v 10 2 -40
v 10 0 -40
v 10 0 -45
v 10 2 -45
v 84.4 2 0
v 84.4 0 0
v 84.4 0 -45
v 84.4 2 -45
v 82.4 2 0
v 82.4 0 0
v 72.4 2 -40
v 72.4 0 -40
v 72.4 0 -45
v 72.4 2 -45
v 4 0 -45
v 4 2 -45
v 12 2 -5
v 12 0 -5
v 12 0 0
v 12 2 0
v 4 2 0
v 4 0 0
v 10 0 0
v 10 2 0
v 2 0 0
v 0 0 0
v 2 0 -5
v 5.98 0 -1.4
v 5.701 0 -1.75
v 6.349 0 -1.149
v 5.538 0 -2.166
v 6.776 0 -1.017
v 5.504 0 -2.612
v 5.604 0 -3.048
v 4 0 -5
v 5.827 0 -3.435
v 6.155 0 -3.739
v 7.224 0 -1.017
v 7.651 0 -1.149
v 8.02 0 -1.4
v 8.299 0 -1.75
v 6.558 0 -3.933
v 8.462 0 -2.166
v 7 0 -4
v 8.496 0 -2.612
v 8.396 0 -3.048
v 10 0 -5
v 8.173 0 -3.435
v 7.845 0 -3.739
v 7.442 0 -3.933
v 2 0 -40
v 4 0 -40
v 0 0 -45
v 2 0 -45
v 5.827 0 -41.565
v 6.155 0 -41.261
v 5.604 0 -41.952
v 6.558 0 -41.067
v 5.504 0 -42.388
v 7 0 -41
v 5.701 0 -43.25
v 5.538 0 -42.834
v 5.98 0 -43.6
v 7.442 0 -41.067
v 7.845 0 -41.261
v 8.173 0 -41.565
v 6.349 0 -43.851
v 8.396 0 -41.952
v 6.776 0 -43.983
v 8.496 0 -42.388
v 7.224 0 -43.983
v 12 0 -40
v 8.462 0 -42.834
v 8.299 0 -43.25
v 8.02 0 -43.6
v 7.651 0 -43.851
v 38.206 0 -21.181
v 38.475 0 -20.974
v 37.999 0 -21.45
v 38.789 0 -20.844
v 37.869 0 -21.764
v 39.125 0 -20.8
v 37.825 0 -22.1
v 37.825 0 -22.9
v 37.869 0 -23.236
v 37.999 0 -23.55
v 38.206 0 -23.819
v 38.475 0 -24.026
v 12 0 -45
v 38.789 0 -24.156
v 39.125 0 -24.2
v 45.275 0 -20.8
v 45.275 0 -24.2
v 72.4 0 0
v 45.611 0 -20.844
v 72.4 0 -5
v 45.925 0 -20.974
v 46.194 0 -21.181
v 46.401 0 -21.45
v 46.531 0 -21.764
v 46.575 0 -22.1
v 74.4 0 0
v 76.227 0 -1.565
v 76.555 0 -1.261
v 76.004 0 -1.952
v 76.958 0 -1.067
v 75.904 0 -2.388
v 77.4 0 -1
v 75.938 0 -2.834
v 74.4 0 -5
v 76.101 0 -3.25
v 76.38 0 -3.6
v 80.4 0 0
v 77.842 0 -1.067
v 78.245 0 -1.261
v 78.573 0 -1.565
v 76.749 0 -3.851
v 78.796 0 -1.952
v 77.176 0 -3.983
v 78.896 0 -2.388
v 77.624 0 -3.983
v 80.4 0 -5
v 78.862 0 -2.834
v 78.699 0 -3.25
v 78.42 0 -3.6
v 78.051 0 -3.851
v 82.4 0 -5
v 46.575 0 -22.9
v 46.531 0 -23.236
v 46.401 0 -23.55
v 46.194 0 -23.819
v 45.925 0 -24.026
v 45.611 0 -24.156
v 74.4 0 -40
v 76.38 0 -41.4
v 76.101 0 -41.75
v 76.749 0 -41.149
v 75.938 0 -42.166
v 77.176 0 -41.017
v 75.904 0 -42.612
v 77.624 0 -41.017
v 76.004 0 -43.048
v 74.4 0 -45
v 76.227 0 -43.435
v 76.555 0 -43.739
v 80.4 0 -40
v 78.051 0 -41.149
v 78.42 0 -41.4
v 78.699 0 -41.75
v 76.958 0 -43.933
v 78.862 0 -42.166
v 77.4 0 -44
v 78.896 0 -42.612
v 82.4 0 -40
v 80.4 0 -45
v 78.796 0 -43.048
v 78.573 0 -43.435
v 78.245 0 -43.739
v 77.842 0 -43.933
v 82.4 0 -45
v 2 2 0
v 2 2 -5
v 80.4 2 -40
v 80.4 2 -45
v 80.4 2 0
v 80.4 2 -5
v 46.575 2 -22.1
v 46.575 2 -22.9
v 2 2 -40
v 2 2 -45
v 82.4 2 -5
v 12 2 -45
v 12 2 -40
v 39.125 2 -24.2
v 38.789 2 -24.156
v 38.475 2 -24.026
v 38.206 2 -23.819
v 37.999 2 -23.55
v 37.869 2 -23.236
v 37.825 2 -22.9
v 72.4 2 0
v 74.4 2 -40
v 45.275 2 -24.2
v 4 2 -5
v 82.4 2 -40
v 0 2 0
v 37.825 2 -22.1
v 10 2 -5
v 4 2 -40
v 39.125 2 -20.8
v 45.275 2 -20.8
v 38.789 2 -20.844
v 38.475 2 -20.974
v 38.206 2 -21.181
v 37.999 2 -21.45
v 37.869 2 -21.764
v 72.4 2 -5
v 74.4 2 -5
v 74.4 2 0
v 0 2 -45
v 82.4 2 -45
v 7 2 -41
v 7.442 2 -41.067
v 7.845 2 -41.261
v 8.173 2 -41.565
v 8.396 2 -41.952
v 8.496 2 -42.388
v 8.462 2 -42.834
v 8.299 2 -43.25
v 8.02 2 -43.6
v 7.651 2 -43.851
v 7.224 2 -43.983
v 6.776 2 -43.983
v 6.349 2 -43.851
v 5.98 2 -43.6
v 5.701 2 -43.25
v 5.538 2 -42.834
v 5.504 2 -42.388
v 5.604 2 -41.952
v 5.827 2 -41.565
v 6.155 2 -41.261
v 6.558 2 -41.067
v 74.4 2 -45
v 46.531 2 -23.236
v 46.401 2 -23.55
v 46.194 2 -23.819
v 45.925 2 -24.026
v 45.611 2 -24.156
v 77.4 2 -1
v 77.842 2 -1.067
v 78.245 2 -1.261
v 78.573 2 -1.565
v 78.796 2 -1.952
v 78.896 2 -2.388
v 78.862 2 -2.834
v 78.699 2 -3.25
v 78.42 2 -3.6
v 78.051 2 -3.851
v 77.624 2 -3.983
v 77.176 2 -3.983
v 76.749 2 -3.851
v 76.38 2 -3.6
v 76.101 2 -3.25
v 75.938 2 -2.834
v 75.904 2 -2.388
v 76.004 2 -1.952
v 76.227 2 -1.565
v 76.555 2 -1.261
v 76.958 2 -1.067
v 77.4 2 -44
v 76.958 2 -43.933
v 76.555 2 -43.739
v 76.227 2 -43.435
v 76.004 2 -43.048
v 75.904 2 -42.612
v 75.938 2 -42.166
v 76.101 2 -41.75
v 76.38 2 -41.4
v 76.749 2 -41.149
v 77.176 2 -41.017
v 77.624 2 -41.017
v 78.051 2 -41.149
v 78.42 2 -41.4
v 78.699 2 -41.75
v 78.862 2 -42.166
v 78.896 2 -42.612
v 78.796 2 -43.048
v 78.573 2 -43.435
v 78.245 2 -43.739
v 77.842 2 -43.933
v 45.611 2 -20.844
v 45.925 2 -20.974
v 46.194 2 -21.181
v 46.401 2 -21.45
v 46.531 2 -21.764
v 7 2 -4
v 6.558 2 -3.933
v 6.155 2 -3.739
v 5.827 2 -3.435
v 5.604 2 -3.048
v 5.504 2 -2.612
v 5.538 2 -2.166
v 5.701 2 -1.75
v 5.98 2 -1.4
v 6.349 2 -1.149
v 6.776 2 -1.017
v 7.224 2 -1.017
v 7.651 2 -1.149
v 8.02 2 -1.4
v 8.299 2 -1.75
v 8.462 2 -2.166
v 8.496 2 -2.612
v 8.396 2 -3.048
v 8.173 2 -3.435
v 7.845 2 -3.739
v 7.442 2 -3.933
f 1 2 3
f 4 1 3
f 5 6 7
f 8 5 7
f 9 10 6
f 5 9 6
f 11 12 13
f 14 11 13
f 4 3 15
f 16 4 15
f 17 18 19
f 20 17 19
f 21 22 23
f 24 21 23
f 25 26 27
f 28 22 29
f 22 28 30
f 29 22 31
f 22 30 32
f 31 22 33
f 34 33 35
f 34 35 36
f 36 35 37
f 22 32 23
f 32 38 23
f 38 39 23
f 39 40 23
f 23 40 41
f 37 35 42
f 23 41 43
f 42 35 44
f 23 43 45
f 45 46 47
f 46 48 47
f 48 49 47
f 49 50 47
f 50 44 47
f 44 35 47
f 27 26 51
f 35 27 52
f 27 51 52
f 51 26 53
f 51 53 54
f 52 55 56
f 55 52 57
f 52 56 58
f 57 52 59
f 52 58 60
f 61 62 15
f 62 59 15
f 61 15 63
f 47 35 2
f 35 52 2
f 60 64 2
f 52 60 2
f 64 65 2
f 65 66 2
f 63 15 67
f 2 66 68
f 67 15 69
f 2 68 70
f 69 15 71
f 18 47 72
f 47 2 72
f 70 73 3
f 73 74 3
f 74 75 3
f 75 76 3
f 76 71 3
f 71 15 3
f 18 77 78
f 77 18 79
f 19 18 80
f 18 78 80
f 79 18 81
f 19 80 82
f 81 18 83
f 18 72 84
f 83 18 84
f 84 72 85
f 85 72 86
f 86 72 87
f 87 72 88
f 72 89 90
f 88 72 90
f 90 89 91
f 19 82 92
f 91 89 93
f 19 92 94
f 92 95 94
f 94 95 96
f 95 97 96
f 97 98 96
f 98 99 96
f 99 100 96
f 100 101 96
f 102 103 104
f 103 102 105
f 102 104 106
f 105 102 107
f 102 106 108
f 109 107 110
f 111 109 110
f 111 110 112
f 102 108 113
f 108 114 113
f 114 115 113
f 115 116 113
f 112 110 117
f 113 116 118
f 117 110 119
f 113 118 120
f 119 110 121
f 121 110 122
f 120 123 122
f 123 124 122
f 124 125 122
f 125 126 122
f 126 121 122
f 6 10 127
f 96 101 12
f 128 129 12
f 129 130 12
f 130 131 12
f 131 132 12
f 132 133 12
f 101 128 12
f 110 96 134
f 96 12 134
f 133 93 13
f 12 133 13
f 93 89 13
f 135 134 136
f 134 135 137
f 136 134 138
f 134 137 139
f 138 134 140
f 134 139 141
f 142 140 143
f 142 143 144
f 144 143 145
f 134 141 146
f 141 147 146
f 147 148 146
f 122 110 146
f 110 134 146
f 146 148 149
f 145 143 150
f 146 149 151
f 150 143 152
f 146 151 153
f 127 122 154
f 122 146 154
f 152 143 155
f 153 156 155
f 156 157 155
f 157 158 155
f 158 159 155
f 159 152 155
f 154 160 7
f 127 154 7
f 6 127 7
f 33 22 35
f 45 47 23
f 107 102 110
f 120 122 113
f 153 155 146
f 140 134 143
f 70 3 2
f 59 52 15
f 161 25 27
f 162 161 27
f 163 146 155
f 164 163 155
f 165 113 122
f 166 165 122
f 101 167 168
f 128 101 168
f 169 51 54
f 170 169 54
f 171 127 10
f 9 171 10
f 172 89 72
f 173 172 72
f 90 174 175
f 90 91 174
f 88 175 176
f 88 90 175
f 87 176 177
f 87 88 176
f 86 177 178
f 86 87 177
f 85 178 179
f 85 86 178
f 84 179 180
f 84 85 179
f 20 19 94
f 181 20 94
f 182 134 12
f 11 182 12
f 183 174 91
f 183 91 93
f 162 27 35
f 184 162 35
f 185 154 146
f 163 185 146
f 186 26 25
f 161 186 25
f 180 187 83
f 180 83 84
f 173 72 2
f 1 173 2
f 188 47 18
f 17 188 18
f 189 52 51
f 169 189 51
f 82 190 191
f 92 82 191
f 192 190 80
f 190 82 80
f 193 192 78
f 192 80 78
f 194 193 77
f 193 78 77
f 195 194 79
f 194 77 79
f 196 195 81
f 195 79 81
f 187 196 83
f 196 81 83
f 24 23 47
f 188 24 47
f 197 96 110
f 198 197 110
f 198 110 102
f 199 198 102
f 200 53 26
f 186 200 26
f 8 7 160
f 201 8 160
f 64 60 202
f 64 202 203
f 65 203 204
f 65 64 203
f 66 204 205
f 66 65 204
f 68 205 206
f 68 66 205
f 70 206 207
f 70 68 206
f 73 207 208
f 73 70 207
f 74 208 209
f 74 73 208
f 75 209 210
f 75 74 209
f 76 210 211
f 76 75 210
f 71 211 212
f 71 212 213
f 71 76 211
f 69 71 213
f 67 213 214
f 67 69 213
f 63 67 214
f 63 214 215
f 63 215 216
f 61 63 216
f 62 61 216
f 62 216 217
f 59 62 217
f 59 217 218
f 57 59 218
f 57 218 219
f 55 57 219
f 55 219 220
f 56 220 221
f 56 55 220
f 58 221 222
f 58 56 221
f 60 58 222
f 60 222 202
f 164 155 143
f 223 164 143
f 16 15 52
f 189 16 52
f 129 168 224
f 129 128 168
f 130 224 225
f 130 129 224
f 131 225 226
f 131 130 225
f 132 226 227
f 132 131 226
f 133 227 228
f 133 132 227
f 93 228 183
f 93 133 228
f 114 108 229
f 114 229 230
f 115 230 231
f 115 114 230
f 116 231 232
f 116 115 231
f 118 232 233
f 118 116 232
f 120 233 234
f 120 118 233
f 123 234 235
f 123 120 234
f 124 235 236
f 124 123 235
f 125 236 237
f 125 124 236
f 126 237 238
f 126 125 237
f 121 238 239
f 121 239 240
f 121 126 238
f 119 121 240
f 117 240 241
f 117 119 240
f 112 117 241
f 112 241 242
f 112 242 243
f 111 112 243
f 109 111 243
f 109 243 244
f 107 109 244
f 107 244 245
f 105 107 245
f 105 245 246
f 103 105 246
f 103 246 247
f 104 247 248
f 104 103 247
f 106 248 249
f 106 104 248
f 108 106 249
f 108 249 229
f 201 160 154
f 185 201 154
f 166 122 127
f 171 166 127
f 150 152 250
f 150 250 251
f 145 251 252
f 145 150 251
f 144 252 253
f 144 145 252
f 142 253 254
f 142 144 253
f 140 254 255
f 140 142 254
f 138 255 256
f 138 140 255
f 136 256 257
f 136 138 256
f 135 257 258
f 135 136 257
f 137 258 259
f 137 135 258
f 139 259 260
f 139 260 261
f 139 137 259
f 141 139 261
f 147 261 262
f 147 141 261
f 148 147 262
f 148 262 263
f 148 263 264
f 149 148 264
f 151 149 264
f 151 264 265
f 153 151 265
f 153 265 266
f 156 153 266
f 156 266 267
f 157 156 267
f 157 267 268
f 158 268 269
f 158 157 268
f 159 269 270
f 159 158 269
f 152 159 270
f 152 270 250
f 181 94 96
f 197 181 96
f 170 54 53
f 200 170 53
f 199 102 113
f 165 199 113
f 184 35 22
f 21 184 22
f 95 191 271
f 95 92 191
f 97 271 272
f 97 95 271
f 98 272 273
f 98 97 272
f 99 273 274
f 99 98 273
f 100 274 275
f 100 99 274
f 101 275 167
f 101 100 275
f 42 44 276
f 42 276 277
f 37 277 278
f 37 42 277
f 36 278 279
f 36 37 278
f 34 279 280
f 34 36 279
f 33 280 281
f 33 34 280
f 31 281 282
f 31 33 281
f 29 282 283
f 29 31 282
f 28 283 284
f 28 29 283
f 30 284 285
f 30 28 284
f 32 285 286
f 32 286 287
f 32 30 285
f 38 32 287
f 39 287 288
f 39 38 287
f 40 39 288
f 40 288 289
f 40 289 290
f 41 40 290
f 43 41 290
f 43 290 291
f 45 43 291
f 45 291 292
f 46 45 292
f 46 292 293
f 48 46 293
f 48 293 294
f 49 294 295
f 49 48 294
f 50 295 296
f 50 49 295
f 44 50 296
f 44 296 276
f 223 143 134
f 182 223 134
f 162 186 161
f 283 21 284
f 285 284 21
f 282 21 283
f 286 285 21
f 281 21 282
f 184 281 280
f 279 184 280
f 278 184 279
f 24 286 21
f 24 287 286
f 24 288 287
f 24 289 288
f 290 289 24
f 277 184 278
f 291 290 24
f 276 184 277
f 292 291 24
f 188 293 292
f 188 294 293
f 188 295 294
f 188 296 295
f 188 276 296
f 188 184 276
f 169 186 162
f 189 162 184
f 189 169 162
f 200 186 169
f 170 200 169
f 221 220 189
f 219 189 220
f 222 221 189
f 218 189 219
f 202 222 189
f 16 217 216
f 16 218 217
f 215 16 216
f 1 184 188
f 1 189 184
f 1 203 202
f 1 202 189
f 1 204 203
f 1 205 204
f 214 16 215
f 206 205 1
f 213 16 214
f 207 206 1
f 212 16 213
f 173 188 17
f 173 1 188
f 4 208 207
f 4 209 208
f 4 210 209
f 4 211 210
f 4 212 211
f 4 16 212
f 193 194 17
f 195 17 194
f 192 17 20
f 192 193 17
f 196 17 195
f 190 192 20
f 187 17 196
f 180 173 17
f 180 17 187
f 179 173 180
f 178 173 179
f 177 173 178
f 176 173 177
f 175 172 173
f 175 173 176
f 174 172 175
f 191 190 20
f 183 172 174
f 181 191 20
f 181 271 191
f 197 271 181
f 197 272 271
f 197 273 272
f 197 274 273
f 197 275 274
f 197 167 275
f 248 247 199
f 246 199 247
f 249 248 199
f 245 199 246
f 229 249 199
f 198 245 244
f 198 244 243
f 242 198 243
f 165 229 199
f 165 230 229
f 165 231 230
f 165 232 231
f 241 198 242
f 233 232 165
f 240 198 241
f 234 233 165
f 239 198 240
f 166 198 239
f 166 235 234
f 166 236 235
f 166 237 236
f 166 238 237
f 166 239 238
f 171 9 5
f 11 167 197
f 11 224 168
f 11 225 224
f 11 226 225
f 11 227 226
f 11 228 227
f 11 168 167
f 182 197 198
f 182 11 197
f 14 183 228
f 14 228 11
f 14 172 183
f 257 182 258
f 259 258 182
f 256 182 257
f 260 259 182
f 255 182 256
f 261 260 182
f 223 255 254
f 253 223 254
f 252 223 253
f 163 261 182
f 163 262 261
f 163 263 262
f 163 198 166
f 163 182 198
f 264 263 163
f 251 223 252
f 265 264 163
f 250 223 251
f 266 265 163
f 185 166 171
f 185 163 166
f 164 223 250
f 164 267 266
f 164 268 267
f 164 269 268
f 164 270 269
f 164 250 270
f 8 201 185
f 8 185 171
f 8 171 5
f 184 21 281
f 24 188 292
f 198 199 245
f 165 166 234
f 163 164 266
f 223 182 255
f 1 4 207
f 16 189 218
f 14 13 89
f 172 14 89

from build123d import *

# Parameters (mm, degrees)
SKETCH1_R           = 1.5
BOSS_EXTRUDE1_DEPTH = 2
SKETCH2_W           = 8.75
SKETCH2_H           = 3.4
CUT_EXTRUDE1_DEPTH  = 10
FILLET1_R           = 1.3


with BuildPart() as part:
    # Sketch1 → Boss-Extrude1 (new body)
    with BuildSketch(Plane(origin=(0, 0, 0), x_dir=(1, 0, 0), z_dir=(0, 1, 0))):
        Polygon((0, 0), (2, 0), (2, 5), (4, 5), (4, 0), (10, 0), (10, 5), (12, 5), (12, 0), (72.4, 0), (72.4, 5), (74.4, 5), (74.4, 0), (80.4, 0), (80.4, 5), (82.4, 5), (82.4, 0), (84.4, 0), (84.4, 45), (82.4, 45), (82.4, 40), (80.4, 40), (80.4, 45), (74.4, 45), (74.4, 40), (72.4, 40), (72.4, 45), (12, 45), (12, 40), (10, 40), (10, 45), (4, 45), (4, 40), (2, 40), (2, 45), (0, 45), align=None)
        with Locations(Location((7, 42.5, 0), (0, 0, 270))):
            Circle(SKETCH1_R, mode=Mode.SUBTRACT)
        with Locations(Location((77.4, 42.5, 0), (0, 0, 90))):
            Circle(SKETCH1_R, mode=Mode.SUBTRACT)
        with Locations(Location((7, 2.5, 0), (0, 0, 90))):
            Circle(SKETCH1_R, mode=Mode.SUBTRACT)
        with Locations(Location((77.4, 2.5, 0), (0, 0, 270))):
            Circle(SKETCH1_R, mode=Mode.SUBTRACT)
    extrude(amount=BOSS_EXTRUDE1_DEPTH)

    # Sketch2 → Cut-Extrude1 (cut)
    with BuildSketch(Plane(origin=(0, 2, 0), x_dir=(1, 0, 0), z_dir=(0, 1, 0))):
        with Locations((42.2, 22.5)):
            Rectangle(SKETCH2_W, SKETCH2_H)
    extrude(amount=-CUT_EXTRUDE1_DEPTH, mode=Mode.SUBTRACT)

    # Fillet1
    fillet1_edges = [part.edges().sort_by_distance(p)[0] for p in [
        (46.575, 1, -24.2),
        (46.575, 1, -20.8),
        (37.825, 1, -20.8),
        (37.825, 1, -24.2),
    ]]
    fillet(fillet1_edges, radius=FILLET1_R)


solid = part.part
